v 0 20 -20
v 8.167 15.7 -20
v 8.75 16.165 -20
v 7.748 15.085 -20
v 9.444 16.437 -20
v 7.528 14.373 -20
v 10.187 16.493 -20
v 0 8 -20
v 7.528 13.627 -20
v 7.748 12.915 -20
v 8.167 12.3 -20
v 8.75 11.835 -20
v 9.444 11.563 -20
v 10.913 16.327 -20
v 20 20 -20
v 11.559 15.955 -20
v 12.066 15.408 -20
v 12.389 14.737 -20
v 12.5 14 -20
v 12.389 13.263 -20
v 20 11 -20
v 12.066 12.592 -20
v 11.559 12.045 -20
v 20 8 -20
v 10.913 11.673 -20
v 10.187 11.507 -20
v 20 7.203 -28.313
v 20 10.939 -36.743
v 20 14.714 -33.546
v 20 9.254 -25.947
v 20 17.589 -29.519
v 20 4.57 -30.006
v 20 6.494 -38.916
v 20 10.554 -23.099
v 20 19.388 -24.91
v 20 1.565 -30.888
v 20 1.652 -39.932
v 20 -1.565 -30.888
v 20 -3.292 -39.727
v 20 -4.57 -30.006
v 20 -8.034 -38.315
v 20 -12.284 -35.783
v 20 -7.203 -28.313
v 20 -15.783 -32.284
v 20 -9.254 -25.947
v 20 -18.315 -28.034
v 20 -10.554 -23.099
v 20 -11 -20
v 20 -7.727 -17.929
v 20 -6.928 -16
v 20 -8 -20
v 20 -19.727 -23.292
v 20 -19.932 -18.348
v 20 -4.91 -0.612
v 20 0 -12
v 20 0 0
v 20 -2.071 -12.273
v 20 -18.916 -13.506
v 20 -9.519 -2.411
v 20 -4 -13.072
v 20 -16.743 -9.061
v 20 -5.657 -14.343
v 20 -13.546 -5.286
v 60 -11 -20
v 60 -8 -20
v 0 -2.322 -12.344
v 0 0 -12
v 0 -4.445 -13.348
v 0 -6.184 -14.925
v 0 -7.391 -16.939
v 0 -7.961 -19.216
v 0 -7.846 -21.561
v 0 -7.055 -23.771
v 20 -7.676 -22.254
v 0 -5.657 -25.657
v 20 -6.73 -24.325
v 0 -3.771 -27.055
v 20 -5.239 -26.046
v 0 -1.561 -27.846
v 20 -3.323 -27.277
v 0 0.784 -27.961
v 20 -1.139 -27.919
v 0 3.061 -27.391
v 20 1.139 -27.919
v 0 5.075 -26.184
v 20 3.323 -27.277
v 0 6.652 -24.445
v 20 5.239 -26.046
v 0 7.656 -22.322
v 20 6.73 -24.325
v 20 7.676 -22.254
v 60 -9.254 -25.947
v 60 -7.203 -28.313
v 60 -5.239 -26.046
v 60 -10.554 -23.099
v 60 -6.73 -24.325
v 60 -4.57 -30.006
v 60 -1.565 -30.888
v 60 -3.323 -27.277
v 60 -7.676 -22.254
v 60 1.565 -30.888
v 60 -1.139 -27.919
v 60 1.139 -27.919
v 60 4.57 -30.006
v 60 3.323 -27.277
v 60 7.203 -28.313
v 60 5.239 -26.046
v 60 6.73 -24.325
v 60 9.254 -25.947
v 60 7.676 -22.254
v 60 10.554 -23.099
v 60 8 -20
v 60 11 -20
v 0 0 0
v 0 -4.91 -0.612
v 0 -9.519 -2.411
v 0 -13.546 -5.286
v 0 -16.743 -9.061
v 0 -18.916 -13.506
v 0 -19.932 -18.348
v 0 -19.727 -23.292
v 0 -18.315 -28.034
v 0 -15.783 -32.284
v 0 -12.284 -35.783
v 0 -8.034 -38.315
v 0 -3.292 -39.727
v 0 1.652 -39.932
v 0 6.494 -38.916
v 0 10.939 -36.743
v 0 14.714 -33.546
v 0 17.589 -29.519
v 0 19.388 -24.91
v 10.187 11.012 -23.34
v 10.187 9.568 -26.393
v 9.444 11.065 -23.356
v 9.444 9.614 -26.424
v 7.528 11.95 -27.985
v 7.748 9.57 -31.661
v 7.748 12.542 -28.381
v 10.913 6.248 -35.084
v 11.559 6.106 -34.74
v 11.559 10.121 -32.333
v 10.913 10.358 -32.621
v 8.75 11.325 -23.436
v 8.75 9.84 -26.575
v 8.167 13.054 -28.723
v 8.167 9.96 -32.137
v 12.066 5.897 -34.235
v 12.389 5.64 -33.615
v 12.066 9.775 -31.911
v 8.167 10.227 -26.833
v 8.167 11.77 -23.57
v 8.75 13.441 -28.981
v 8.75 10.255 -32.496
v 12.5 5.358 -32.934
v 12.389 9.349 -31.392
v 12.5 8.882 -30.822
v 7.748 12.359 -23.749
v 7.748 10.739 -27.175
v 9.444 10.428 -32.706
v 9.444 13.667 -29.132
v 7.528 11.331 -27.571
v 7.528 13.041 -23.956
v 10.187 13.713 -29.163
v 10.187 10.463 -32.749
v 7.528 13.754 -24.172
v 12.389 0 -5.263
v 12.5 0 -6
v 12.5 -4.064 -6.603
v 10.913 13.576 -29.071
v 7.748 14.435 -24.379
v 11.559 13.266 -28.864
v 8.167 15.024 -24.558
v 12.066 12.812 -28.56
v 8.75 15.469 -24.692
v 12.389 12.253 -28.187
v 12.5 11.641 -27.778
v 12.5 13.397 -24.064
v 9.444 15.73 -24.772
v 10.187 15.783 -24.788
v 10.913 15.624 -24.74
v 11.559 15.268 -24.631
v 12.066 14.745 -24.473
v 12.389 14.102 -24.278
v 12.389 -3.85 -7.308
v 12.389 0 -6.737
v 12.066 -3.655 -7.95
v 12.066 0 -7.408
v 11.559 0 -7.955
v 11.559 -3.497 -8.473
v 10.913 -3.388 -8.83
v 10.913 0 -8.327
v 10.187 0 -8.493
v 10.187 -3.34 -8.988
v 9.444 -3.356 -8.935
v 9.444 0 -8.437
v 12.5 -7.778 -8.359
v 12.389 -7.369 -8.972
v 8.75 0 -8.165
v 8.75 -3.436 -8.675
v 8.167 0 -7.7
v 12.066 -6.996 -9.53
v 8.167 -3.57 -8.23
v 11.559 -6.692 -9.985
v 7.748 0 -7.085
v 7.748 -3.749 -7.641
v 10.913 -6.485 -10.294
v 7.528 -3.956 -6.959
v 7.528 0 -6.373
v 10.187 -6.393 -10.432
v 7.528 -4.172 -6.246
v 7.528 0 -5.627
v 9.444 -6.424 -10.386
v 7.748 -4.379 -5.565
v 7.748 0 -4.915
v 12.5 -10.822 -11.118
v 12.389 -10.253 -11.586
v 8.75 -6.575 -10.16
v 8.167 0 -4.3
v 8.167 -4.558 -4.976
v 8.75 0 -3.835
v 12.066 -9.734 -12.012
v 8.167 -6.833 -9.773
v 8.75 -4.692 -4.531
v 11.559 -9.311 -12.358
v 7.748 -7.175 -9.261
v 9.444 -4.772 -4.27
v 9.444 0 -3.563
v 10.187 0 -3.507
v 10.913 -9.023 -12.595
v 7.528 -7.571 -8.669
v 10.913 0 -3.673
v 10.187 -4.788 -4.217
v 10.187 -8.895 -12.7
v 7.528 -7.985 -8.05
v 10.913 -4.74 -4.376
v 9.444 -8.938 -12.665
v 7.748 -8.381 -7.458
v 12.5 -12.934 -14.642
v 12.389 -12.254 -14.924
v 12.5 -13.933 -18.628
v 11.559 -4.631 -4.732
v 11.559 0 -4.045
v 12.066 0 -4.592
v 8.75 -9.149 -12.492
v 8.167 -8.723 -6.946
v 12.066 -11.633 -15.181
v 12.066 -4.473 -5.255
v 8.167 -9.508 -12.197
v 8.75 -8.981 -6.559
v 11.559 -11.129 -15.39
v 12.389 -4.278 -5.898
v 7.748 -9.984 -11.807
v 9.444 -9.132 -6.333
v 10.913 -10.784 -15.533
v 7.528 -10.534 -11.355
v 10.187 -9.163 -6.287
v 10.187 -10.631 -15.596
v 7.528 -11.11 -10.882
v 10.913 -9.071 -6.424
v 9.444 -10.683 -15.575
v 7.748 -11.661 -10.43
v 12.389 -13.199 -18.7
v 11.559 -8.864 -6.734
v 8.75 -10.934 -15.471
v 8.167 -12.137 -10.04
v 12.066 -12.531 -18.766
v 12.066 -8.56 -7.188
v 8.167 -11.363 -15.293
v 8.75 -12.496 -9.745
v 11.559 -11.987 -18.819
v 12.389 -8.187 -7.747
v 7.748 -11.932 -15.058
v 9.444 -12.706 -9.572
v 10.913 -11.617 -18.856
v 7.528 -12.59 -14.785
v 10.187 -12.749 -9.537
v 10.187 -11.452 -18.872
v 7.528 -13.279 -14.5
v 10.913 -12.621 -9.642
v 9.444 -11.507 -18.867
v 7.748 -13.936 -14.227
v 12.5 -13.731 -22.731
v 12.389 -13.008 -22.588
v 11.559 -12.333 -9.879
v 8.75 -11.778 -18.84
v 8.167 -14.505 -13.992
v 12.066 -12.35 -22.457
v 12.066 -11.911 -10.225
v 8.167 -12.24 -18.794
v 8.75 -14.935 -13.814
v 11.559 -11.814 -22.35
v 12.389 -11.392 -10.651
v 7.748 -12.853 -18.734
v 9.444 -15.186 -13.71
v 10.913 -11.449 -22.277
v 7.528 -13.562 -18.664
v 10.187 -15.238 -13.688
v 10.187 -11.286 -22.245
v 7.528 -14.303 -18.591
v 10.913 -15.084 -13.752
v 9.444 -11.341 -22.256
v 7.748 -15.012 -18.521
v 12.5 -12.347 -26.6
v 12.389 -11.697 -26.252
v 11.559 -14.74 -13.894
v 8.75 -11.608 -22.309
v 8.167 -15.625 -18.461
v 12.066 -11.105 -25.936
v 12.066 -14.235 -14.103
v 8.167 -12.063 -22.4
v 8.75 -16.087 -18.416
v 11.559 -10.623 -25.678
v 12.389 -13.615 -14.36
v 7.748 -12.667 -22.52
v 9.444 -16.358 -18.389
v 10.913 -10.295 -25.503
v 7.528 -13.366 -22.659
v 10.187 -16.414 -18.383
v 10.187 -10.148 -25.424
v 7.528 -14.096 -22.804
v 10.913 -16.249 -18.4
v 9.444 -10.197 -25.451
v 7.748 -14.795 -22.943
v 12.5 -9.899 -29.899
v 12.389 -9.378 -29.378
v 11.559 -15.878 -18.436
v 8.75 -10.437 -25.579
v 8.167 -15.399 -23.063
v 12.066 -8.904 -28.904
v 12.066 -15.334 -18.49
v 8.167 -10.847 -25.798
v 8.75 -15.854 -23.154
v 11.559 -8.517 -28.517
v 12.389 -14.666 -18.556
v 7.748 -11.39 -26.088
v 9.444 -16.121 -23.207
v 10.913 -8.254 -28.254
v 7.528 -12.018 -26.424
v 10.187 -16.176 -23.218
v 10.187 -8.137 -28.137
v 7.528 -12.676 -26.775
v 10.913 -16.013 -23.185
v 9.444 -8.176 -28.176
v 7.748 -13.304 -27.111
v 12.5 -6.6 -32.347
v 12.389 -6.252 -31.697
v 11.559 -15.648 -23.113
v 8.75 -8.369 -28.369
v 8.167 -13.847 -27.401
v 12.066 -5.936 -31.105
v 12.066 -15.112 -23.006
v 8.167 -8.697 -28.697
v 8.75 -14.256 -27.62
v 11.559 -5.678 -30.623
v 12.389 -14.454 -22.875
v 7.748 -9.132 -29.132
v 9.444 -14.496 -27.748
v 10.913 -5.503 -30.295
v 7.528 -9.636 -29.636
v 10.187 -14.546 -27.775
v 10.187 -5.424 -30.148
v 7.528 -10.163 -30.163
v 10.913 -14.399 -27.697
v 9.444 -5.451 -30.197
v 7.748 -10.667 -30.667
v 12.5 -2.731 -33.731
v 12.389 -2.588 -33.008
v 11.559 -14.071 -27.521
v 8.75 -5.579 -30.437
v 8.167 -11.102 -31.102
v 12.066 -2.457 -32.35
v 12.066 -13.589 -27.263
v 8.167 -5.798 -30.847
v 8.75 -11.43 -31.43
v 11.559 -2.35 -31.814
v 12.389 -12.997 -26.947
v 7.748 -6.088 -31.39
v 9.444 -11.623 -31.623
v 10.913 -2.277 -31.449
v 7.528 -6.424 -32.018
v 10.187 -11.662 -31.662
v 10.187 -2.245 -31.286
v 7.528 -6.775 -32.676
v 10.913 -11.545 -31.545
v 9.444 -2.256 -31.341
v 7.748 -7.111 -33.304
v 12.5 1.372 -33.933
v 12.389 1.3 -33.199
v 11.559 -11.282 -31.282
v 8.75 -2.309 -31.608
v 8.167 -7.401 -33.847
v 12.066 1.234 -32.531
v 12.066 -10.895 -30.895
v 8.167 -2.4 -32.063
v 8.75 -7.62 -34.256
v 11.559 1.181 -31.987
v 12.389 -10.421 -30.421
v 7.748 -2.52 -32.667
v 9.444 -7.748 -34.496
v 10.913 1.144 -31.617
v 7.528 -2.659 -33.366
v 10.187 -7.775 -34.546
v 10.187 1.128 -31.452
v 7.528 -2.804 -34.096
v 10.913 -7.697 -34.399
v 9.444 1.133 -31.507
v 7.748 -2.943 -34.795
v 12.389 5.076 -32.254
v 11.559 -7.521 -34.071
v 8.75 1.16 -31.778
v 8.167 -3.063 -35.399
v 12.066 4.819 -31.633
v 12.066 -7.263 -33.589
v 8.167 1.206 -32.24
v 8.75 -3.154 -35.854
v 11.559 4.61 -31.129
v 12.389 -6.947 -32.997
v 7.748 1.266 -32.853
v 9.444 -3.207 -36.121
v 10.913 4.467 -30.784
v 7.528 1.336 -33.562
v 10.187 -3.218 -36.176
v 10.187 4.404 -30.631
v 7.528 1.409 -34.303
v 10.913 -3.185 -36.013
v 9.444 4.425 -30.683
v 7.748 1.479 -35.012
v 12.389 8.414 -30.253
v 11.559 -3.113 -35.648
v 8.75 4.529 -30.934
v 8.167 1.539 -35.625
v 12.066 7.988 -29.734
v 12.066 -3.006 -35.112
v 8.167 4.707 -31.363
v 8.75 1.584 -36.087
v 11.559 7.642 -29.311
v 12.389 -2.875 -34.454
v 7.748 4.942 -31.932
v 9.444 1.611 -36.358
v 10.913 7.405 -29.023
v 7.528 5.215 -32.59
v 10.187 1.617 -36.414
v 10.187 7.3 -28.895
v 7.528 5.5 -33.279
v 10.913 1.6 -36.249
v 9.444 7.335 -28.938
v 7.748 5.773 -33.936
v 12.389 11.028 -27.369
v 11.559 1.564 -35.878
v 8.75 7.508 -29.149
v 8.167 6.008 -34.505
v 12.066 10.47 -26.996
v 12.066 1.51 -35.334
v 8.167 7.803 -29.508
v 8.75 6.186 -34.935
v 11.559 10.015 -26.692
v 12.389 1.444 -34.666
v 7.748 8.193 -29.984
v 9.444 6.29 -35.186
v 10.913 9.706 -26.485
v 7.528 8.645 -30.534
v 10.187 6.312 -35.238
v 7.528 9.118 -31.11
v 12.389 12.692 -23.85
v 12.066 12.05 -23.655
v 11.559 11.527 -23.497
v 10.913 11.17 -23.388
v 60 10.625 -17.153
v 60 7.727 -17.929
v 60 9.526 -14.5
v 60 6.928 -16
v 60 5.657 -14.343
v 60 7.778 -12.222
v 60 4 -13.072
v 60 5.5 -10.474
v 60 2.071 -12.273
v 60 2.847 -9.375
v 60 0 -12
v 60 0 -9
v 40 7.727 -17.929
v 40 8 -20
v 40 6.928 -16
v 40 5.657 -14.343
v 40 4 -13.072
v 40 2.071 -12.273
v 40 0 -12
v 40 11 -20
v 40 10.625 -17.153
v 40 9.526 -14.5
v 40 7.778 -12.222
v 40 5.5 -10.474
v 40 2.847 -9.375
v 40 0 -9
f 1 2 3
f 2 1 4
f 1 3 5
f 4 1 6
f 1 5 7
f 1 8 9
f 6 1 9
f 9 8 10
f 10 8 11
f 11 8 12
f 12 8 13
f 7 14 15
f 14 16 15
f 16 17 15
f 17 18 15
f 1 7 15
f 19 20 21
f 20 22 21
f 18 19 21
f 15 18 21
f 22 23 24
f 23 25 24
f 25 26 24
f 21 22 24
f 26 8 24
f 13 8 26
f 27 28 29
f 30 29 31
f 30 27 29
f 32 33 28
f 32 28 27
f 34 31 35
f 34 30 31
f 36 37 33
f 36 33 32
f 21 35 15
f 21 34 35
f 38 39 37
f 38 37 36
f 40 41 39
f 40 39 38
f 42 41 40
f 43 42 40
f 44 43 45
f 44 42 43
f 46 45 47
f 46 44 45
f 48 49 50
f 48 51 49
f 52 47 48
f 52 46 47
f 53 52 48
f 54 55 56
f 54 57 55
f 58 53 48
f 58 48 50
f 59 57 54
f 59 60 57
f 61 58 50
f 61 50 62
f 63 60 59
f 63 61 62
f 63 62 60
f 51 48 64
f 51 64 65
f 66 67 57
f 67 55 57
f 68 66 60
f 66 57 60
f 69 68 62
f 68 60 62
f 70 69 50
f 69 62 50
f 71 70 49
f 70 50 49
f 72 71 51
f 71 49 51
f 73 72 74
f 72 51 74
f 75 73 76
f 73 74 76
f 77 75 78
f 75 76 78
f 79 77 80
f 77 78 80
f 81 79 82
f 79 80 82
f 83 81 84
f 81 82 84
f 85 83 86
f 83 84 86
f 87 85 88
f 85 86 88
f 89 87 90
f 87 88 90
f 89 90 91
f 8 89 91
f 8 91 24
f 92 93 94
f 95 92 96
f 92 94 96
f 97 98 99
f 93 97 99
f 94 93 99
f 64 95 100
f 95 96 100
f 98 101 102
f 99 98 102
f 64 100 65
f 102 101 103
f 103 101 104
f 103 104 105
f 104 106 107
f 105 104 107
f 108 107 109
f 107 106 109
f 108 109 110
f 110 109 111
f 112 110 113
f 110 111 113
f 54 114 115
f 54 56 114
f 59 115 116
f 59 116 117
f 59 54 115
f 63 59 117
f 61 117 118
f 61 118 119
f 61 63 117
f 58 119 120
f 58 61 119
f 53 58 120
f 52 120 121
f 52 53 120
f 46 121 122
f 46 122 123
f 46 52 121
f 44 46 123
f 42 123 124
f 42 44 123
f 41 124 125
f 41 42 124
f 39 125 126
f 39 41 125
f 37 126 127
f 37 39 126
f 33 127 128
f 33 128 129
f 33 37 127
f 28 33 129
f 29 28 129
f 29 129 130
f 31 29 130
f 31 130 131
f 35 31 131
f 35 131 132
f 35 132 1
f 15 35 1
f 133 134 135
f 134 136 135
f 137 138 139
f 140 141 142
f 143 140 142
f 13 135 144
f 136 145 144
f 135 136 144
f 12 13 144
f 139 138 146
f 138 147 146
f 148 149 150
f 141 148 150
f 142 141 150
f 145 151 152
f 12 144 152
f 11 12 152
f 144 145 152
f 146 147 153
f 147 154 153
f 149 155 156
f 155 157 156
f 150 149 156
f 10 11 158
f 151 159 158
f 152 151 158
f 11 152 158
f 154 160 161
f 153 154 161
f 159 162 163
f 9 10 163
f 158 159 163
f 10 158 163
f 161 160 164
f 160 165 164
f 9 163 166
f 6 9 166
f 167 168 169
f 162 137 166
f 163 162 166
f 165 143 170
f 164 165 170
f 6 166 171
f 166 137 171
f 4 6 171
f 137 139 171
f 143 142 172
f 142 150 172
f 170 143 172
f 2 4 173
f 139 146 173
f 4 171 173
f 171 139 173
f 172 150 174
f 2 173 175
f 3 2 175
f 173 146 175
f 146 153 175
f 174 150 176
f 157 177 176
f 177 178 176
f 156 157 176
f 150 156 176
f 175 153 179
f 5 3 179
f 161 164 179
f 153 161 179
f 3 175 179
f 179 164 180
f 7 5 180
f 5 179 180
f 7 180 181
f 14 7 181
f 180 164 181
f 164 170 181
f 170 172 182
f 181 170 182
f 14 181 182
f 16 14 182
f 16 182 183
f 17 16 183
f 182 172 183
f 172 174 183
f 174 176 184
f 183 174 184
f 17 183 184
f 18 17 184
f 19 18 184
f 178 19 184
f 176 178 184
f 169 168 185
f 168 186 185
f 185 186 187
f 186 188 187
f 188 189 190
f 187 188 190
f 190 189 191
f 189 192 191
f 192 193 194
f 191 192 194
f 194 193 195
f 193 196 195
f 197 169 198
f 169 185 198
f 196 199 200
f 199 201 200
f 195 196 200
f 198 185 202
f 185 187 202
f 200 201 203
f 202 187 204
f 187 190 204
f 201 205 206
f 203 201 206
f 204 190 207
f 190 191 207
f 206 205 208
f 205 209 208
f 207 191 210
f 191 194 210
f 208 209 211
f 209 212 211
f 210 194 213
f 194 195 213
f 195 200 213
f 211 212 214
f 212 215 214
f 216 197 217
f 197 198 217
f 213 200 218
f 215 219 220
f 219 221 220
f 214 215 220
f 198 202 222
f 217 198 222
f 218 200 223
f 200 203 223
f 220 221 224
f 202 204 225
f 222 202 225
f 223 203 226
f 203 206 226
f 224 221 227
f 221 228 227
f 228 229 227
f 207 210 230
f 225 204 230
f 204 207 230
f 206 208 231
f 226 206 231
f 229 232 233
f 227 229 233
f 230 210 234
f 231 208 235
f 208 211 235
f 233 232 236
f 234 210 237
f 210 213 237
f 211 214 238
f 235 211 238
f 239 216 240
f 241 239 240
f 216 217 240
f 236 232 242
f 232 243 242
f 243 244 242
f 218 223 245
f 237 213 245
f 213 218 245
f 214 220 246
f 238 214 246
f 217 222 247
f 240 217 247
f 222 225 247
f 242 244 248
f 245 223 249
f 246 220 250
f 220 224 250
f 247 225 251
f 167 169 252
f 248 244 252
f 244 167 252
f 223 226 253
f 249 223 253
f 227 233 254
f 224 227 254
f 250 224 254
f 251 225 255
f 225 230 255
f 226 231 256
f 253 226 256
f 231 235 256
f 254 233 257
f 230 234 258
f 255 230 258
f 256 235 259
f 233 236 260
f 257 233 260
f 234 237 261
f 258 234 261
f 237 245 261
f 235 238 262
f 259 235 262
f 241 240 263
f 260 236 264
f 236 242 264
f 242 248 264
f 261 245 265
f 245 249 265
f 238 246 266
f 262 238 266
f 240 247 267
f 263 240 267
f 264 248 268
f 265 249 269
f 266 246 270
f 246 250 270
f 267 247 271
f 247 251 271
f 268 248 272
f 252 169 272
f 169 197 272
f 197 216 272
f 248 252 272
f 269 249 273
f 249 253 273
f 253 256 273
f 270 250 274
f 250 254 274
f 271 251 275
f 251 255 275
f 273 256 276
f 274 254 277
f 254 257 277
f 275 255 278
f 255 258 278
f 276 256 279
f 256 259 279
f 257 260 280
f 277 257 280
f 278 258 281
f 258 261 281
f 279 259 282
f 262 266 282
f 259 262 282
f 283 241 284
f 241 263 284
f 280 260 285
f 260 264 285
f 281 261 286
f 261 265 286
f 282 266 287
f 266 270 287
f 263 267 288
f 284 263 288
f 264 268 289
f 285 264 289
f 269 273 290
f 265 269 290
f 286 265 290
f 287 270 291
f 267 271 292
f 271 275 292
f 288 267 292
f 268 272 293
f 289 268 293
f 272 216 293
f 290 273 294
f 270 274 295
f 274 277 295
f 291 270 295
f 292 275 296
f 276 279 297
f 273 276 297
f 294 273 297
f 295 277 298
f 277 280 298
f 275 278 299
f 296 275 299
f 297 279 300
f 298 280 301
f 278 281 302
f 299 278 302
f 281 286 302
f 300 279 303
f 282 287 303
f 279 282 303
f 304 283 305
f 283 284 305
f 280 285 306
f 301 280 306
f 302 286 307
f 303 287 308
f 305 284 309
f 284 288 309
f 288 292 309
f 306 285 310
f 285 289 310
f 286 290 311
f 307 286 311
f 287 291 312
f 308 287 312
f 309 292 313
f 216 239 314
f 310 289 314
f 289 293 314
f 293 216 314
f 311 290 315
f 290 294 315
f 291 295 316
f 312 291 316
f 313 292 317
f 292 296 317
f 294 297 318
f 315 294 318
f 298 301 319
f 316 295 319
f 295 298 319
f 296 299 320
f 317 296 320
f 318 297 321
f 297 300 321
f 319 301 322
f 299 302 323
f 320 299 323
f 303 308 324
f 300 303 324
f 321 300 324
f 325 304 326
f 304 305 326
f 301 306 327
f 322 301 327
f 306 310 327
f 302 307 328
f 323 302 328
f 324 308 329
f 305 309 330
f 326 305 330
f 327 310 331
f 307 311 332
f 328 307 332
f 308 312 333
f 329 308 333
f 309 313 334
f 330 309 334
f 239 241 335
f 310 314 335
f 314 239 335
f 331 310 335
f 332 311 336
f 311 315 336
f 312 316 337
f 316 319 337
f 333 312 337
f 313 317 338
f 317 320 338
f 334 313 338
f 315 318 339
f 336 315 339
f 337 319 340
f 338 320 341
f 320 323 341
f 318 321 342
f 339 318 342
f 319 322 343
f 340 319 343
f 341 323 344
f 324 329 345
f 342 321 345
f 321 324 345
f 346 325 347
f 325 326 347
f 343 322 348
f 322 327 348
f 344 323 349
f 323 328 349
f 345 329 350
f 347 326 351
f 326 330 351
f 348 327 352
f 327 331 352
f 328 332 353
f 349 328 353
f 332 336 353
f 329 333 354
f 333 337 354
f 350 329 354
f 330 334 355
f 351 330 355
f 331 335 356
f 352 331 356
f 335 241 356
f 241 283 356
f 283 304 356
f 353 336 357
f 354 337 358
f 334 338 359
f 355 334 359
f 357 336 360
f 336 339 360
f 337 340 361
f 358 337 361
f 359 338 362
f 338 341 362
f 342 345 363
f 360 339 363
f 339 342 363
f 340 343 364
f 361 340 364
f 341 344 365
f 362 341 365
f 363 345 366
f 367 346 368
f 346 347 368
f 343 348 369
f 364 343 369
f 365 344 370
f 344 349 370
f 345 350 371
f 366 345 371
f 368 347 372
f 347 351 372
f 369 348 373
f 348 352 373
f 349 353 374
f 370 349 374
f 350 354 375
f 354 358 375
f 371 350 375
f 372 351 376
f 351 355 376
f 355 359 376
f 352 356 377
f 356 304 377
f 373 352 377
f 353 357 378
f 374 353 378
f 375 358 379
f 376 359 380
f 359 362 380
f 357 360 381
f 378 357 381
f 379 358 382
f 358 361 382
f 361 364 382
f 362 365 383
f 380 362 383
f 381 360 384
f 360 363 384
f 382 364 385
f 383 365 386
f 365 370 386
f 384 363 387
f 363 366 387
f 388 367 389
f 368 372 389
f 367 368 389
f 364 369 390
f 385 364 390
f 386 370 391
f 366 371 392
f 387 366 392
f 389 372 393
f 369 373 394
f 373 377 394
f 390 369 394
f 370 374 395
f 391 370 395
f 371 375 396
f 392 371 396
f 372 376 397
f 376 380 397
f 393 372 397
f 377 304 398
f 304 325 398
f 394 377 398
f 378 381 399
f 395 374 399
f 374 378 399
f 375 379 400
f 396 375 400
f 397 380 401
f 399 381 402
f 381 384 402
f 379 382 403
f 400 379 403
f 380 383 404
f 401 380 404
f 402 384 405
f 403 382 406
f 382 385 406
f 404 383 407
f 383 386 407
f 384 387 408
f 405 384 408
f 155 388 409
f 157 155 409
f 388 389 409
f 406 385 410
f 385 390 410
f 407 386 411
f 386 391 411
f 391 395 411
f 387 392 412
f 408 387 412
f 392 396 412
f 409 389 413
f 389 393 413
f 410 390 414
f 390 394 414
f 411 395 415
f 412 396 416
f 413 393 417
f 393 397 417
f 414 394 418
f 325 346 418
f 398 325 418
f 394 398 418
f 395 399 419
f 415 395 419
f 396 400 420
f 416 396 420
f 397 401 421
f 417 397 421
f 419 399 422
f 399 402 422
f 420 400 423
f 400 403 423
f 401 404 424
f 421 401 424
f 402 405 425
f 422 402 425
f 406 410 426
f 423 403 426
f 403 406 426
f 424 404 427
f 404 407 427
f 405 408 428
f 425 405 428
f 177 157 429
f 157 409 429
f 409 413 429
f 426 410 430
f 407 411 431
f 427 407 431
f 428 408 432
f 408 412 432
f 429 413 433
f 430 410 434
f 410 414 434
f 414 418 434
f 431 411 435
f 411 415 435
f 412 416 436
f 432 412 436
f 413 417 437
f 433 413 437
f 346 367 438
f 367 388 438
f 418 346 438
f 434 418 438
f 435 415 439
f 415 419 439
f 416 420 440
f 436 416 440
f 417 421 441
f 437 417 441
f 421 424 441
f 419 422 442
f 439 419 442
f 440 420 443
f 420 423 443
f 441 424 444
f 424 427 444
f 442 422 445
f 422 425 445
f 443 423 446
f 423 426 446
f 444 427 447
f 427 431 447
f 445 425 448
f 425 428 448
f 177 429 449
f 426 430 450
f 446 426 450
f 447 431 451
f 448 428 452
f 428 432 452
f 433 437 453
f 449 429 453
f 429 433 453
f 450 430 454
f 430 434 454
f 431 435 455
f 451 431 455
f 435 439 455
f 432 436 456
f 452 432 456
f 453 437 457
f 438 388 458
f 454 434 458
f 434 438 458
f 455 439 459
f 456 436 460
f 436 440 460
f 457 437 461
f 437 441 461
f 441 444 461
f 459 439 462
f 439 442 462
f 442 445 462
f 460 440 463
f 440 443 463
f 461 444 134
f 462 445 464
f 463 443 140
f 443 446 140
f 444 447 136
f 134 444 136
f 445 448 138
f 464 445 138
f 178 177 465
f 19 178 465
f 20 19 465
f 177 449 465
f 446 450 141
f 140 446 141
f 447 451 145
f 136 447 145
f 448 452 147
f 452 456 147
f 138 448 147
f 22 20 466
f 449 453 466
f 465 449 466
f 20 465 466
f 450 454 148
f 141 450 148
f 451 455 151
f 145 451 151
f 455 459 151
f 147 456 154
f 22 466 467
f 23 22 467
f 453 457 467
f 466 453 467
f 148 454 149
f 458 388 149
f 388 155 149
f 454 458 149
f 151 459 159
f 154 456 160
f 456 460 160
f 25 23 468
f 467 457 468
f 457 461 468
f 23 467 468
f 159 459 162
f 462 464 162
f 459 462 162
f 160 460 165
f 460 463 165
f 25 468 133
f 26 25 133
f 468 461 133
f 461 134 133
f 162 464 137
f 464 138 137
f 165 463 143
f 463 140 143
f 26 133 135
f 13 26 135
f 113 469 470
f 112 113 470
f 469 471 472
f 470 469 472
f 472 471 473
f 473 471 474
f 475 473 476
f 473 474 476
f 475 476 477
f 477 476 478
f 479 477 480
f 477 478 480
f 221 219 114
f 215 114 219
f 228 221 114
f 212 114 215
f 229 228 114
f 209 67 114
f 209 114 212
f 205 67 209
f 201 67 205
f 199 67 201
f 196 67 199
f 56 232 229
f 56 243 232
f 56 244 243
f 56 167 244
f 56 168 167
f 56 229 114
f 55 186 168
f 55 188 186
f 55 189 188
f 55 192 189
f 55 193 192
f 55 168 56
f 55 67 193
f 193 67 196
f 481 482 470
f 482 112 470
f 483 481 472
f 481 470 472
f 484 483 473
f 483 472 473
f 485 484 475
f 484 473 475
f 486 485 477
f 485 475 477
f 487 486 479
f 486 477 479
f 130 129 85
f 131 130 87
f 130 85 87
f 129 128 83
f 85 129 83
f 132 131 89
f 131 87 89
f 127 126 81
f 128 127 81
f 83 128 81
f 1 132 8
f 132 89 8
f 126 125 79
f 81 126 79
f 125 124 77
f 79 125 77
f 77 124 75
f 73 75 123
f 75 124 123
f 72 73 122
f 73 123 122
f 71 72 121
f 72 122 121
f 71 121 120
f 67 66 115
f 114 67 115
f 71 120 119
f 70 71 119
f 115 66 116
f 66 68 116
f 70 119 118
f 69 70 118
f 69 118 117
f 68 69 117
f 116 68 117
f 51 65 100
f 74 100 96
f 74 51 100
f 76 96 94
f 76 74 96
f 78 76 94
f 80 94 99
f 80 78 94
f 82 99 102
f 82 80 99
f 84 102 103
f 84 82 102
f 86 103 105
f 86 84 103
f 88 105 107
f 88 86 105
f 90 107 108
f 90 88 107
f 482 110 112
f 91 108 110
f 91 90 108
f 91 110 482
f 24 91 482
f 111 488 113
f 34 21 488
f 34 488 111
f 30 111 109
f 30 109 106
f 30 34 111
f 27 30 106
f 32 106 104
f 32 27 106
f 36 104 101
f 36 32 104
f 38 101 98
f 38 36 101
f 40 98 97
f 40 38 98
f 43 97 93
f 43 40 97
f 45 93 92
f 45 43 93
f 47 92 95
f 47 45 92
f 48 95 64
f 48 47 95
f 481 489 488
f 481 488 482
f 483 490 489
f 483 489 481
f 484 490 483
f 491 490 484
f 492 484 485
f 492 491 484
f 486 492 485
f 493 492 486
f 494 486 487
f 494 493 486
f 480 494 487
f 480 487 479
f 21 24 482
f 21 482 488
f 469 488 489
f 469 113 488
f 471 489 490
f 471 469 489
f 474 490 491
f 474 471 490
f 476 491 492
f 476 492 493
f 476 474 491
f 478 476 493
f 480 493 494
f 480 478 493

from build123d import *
from build123d.topology import SkipClean

# Parameters (mm, degrees)
SKETCH1_W           = 20
SKETCH1_H           = 12
REVOLVE2_ANGLE      = 270
SKETCH4_R           = 2.5
CUT_REVOLVE1_ANGLE  = 270
BOSS_EXTRUDE3_DEPTH = 40
SKETCH10_W          = 20
SKETCH10_H          = 3
REVOLVE4_ANGLE      = 90


with BuildPart() as part:
    # Sketch1 → Revolve2 (revolve)
    with BuildSketch(Plane(origin=(0, 0, 0), x_dir=(1, 0, 0), z_dir=(0, 1, 0))):
        with Locations((10, 6)):
            Rectangle(SKETCH1_W, SKETCH1_H)
    revolve(axis=Axis((0, 0, -20), (1, 0, 0)), revolution_arc=REVOLVE2_ANGLE)

    # Sketch4 → Cut-Revolve1 (revolve, cut)
    with BuildSketch(Plane(origin=(0, 0, 0), x_dir=(1, 0, 0), z_dir=(0, 1, 0))):
        with Locations((10, 6)):
            Circle(SKETCH4_R)
    revolve(axis=Axis((20, 0, -20), (1, 0, 0)), revolution_arc=CUT_REVOLVE1_ANGLE, mode=Mode.SUBTRACT)

    # Sketch9 → Boss-Extrude3 (add)
    with BuildSketch(Plane(origin=(20, 0, 0), x_dir=(0, 0, -1), z_dir=(1, 0, 0))):
        with BuildLine():
            Line((20, -11), (20, -8))
            ThreePointArc((20, -8), (28, 0), (20, 8))
            Line((20, 8), (20, 11))
            ThreePointArc((20, 11), (31, 0), (20, -11))
        make_face()
    extrude(amount=BOSS_EXTRUDE3_DEPTH)

    # Sketch10 → Revolve4 (revolve)
    with SkipClean():  # the faces are left unmerged after this step: merging them gives an invalid solid
        with BuildSketch(Plane.XY.offset(-20)):
            with Locations((50, 9.5)):
                Rectangle(SKETCH10_W, SKETCH10_H)
        revolve(axis=Axis((20, 0, -20), (1, 0, 0)), revolution_arc=REVOLVE4_ANGLE)


solid = part.part
